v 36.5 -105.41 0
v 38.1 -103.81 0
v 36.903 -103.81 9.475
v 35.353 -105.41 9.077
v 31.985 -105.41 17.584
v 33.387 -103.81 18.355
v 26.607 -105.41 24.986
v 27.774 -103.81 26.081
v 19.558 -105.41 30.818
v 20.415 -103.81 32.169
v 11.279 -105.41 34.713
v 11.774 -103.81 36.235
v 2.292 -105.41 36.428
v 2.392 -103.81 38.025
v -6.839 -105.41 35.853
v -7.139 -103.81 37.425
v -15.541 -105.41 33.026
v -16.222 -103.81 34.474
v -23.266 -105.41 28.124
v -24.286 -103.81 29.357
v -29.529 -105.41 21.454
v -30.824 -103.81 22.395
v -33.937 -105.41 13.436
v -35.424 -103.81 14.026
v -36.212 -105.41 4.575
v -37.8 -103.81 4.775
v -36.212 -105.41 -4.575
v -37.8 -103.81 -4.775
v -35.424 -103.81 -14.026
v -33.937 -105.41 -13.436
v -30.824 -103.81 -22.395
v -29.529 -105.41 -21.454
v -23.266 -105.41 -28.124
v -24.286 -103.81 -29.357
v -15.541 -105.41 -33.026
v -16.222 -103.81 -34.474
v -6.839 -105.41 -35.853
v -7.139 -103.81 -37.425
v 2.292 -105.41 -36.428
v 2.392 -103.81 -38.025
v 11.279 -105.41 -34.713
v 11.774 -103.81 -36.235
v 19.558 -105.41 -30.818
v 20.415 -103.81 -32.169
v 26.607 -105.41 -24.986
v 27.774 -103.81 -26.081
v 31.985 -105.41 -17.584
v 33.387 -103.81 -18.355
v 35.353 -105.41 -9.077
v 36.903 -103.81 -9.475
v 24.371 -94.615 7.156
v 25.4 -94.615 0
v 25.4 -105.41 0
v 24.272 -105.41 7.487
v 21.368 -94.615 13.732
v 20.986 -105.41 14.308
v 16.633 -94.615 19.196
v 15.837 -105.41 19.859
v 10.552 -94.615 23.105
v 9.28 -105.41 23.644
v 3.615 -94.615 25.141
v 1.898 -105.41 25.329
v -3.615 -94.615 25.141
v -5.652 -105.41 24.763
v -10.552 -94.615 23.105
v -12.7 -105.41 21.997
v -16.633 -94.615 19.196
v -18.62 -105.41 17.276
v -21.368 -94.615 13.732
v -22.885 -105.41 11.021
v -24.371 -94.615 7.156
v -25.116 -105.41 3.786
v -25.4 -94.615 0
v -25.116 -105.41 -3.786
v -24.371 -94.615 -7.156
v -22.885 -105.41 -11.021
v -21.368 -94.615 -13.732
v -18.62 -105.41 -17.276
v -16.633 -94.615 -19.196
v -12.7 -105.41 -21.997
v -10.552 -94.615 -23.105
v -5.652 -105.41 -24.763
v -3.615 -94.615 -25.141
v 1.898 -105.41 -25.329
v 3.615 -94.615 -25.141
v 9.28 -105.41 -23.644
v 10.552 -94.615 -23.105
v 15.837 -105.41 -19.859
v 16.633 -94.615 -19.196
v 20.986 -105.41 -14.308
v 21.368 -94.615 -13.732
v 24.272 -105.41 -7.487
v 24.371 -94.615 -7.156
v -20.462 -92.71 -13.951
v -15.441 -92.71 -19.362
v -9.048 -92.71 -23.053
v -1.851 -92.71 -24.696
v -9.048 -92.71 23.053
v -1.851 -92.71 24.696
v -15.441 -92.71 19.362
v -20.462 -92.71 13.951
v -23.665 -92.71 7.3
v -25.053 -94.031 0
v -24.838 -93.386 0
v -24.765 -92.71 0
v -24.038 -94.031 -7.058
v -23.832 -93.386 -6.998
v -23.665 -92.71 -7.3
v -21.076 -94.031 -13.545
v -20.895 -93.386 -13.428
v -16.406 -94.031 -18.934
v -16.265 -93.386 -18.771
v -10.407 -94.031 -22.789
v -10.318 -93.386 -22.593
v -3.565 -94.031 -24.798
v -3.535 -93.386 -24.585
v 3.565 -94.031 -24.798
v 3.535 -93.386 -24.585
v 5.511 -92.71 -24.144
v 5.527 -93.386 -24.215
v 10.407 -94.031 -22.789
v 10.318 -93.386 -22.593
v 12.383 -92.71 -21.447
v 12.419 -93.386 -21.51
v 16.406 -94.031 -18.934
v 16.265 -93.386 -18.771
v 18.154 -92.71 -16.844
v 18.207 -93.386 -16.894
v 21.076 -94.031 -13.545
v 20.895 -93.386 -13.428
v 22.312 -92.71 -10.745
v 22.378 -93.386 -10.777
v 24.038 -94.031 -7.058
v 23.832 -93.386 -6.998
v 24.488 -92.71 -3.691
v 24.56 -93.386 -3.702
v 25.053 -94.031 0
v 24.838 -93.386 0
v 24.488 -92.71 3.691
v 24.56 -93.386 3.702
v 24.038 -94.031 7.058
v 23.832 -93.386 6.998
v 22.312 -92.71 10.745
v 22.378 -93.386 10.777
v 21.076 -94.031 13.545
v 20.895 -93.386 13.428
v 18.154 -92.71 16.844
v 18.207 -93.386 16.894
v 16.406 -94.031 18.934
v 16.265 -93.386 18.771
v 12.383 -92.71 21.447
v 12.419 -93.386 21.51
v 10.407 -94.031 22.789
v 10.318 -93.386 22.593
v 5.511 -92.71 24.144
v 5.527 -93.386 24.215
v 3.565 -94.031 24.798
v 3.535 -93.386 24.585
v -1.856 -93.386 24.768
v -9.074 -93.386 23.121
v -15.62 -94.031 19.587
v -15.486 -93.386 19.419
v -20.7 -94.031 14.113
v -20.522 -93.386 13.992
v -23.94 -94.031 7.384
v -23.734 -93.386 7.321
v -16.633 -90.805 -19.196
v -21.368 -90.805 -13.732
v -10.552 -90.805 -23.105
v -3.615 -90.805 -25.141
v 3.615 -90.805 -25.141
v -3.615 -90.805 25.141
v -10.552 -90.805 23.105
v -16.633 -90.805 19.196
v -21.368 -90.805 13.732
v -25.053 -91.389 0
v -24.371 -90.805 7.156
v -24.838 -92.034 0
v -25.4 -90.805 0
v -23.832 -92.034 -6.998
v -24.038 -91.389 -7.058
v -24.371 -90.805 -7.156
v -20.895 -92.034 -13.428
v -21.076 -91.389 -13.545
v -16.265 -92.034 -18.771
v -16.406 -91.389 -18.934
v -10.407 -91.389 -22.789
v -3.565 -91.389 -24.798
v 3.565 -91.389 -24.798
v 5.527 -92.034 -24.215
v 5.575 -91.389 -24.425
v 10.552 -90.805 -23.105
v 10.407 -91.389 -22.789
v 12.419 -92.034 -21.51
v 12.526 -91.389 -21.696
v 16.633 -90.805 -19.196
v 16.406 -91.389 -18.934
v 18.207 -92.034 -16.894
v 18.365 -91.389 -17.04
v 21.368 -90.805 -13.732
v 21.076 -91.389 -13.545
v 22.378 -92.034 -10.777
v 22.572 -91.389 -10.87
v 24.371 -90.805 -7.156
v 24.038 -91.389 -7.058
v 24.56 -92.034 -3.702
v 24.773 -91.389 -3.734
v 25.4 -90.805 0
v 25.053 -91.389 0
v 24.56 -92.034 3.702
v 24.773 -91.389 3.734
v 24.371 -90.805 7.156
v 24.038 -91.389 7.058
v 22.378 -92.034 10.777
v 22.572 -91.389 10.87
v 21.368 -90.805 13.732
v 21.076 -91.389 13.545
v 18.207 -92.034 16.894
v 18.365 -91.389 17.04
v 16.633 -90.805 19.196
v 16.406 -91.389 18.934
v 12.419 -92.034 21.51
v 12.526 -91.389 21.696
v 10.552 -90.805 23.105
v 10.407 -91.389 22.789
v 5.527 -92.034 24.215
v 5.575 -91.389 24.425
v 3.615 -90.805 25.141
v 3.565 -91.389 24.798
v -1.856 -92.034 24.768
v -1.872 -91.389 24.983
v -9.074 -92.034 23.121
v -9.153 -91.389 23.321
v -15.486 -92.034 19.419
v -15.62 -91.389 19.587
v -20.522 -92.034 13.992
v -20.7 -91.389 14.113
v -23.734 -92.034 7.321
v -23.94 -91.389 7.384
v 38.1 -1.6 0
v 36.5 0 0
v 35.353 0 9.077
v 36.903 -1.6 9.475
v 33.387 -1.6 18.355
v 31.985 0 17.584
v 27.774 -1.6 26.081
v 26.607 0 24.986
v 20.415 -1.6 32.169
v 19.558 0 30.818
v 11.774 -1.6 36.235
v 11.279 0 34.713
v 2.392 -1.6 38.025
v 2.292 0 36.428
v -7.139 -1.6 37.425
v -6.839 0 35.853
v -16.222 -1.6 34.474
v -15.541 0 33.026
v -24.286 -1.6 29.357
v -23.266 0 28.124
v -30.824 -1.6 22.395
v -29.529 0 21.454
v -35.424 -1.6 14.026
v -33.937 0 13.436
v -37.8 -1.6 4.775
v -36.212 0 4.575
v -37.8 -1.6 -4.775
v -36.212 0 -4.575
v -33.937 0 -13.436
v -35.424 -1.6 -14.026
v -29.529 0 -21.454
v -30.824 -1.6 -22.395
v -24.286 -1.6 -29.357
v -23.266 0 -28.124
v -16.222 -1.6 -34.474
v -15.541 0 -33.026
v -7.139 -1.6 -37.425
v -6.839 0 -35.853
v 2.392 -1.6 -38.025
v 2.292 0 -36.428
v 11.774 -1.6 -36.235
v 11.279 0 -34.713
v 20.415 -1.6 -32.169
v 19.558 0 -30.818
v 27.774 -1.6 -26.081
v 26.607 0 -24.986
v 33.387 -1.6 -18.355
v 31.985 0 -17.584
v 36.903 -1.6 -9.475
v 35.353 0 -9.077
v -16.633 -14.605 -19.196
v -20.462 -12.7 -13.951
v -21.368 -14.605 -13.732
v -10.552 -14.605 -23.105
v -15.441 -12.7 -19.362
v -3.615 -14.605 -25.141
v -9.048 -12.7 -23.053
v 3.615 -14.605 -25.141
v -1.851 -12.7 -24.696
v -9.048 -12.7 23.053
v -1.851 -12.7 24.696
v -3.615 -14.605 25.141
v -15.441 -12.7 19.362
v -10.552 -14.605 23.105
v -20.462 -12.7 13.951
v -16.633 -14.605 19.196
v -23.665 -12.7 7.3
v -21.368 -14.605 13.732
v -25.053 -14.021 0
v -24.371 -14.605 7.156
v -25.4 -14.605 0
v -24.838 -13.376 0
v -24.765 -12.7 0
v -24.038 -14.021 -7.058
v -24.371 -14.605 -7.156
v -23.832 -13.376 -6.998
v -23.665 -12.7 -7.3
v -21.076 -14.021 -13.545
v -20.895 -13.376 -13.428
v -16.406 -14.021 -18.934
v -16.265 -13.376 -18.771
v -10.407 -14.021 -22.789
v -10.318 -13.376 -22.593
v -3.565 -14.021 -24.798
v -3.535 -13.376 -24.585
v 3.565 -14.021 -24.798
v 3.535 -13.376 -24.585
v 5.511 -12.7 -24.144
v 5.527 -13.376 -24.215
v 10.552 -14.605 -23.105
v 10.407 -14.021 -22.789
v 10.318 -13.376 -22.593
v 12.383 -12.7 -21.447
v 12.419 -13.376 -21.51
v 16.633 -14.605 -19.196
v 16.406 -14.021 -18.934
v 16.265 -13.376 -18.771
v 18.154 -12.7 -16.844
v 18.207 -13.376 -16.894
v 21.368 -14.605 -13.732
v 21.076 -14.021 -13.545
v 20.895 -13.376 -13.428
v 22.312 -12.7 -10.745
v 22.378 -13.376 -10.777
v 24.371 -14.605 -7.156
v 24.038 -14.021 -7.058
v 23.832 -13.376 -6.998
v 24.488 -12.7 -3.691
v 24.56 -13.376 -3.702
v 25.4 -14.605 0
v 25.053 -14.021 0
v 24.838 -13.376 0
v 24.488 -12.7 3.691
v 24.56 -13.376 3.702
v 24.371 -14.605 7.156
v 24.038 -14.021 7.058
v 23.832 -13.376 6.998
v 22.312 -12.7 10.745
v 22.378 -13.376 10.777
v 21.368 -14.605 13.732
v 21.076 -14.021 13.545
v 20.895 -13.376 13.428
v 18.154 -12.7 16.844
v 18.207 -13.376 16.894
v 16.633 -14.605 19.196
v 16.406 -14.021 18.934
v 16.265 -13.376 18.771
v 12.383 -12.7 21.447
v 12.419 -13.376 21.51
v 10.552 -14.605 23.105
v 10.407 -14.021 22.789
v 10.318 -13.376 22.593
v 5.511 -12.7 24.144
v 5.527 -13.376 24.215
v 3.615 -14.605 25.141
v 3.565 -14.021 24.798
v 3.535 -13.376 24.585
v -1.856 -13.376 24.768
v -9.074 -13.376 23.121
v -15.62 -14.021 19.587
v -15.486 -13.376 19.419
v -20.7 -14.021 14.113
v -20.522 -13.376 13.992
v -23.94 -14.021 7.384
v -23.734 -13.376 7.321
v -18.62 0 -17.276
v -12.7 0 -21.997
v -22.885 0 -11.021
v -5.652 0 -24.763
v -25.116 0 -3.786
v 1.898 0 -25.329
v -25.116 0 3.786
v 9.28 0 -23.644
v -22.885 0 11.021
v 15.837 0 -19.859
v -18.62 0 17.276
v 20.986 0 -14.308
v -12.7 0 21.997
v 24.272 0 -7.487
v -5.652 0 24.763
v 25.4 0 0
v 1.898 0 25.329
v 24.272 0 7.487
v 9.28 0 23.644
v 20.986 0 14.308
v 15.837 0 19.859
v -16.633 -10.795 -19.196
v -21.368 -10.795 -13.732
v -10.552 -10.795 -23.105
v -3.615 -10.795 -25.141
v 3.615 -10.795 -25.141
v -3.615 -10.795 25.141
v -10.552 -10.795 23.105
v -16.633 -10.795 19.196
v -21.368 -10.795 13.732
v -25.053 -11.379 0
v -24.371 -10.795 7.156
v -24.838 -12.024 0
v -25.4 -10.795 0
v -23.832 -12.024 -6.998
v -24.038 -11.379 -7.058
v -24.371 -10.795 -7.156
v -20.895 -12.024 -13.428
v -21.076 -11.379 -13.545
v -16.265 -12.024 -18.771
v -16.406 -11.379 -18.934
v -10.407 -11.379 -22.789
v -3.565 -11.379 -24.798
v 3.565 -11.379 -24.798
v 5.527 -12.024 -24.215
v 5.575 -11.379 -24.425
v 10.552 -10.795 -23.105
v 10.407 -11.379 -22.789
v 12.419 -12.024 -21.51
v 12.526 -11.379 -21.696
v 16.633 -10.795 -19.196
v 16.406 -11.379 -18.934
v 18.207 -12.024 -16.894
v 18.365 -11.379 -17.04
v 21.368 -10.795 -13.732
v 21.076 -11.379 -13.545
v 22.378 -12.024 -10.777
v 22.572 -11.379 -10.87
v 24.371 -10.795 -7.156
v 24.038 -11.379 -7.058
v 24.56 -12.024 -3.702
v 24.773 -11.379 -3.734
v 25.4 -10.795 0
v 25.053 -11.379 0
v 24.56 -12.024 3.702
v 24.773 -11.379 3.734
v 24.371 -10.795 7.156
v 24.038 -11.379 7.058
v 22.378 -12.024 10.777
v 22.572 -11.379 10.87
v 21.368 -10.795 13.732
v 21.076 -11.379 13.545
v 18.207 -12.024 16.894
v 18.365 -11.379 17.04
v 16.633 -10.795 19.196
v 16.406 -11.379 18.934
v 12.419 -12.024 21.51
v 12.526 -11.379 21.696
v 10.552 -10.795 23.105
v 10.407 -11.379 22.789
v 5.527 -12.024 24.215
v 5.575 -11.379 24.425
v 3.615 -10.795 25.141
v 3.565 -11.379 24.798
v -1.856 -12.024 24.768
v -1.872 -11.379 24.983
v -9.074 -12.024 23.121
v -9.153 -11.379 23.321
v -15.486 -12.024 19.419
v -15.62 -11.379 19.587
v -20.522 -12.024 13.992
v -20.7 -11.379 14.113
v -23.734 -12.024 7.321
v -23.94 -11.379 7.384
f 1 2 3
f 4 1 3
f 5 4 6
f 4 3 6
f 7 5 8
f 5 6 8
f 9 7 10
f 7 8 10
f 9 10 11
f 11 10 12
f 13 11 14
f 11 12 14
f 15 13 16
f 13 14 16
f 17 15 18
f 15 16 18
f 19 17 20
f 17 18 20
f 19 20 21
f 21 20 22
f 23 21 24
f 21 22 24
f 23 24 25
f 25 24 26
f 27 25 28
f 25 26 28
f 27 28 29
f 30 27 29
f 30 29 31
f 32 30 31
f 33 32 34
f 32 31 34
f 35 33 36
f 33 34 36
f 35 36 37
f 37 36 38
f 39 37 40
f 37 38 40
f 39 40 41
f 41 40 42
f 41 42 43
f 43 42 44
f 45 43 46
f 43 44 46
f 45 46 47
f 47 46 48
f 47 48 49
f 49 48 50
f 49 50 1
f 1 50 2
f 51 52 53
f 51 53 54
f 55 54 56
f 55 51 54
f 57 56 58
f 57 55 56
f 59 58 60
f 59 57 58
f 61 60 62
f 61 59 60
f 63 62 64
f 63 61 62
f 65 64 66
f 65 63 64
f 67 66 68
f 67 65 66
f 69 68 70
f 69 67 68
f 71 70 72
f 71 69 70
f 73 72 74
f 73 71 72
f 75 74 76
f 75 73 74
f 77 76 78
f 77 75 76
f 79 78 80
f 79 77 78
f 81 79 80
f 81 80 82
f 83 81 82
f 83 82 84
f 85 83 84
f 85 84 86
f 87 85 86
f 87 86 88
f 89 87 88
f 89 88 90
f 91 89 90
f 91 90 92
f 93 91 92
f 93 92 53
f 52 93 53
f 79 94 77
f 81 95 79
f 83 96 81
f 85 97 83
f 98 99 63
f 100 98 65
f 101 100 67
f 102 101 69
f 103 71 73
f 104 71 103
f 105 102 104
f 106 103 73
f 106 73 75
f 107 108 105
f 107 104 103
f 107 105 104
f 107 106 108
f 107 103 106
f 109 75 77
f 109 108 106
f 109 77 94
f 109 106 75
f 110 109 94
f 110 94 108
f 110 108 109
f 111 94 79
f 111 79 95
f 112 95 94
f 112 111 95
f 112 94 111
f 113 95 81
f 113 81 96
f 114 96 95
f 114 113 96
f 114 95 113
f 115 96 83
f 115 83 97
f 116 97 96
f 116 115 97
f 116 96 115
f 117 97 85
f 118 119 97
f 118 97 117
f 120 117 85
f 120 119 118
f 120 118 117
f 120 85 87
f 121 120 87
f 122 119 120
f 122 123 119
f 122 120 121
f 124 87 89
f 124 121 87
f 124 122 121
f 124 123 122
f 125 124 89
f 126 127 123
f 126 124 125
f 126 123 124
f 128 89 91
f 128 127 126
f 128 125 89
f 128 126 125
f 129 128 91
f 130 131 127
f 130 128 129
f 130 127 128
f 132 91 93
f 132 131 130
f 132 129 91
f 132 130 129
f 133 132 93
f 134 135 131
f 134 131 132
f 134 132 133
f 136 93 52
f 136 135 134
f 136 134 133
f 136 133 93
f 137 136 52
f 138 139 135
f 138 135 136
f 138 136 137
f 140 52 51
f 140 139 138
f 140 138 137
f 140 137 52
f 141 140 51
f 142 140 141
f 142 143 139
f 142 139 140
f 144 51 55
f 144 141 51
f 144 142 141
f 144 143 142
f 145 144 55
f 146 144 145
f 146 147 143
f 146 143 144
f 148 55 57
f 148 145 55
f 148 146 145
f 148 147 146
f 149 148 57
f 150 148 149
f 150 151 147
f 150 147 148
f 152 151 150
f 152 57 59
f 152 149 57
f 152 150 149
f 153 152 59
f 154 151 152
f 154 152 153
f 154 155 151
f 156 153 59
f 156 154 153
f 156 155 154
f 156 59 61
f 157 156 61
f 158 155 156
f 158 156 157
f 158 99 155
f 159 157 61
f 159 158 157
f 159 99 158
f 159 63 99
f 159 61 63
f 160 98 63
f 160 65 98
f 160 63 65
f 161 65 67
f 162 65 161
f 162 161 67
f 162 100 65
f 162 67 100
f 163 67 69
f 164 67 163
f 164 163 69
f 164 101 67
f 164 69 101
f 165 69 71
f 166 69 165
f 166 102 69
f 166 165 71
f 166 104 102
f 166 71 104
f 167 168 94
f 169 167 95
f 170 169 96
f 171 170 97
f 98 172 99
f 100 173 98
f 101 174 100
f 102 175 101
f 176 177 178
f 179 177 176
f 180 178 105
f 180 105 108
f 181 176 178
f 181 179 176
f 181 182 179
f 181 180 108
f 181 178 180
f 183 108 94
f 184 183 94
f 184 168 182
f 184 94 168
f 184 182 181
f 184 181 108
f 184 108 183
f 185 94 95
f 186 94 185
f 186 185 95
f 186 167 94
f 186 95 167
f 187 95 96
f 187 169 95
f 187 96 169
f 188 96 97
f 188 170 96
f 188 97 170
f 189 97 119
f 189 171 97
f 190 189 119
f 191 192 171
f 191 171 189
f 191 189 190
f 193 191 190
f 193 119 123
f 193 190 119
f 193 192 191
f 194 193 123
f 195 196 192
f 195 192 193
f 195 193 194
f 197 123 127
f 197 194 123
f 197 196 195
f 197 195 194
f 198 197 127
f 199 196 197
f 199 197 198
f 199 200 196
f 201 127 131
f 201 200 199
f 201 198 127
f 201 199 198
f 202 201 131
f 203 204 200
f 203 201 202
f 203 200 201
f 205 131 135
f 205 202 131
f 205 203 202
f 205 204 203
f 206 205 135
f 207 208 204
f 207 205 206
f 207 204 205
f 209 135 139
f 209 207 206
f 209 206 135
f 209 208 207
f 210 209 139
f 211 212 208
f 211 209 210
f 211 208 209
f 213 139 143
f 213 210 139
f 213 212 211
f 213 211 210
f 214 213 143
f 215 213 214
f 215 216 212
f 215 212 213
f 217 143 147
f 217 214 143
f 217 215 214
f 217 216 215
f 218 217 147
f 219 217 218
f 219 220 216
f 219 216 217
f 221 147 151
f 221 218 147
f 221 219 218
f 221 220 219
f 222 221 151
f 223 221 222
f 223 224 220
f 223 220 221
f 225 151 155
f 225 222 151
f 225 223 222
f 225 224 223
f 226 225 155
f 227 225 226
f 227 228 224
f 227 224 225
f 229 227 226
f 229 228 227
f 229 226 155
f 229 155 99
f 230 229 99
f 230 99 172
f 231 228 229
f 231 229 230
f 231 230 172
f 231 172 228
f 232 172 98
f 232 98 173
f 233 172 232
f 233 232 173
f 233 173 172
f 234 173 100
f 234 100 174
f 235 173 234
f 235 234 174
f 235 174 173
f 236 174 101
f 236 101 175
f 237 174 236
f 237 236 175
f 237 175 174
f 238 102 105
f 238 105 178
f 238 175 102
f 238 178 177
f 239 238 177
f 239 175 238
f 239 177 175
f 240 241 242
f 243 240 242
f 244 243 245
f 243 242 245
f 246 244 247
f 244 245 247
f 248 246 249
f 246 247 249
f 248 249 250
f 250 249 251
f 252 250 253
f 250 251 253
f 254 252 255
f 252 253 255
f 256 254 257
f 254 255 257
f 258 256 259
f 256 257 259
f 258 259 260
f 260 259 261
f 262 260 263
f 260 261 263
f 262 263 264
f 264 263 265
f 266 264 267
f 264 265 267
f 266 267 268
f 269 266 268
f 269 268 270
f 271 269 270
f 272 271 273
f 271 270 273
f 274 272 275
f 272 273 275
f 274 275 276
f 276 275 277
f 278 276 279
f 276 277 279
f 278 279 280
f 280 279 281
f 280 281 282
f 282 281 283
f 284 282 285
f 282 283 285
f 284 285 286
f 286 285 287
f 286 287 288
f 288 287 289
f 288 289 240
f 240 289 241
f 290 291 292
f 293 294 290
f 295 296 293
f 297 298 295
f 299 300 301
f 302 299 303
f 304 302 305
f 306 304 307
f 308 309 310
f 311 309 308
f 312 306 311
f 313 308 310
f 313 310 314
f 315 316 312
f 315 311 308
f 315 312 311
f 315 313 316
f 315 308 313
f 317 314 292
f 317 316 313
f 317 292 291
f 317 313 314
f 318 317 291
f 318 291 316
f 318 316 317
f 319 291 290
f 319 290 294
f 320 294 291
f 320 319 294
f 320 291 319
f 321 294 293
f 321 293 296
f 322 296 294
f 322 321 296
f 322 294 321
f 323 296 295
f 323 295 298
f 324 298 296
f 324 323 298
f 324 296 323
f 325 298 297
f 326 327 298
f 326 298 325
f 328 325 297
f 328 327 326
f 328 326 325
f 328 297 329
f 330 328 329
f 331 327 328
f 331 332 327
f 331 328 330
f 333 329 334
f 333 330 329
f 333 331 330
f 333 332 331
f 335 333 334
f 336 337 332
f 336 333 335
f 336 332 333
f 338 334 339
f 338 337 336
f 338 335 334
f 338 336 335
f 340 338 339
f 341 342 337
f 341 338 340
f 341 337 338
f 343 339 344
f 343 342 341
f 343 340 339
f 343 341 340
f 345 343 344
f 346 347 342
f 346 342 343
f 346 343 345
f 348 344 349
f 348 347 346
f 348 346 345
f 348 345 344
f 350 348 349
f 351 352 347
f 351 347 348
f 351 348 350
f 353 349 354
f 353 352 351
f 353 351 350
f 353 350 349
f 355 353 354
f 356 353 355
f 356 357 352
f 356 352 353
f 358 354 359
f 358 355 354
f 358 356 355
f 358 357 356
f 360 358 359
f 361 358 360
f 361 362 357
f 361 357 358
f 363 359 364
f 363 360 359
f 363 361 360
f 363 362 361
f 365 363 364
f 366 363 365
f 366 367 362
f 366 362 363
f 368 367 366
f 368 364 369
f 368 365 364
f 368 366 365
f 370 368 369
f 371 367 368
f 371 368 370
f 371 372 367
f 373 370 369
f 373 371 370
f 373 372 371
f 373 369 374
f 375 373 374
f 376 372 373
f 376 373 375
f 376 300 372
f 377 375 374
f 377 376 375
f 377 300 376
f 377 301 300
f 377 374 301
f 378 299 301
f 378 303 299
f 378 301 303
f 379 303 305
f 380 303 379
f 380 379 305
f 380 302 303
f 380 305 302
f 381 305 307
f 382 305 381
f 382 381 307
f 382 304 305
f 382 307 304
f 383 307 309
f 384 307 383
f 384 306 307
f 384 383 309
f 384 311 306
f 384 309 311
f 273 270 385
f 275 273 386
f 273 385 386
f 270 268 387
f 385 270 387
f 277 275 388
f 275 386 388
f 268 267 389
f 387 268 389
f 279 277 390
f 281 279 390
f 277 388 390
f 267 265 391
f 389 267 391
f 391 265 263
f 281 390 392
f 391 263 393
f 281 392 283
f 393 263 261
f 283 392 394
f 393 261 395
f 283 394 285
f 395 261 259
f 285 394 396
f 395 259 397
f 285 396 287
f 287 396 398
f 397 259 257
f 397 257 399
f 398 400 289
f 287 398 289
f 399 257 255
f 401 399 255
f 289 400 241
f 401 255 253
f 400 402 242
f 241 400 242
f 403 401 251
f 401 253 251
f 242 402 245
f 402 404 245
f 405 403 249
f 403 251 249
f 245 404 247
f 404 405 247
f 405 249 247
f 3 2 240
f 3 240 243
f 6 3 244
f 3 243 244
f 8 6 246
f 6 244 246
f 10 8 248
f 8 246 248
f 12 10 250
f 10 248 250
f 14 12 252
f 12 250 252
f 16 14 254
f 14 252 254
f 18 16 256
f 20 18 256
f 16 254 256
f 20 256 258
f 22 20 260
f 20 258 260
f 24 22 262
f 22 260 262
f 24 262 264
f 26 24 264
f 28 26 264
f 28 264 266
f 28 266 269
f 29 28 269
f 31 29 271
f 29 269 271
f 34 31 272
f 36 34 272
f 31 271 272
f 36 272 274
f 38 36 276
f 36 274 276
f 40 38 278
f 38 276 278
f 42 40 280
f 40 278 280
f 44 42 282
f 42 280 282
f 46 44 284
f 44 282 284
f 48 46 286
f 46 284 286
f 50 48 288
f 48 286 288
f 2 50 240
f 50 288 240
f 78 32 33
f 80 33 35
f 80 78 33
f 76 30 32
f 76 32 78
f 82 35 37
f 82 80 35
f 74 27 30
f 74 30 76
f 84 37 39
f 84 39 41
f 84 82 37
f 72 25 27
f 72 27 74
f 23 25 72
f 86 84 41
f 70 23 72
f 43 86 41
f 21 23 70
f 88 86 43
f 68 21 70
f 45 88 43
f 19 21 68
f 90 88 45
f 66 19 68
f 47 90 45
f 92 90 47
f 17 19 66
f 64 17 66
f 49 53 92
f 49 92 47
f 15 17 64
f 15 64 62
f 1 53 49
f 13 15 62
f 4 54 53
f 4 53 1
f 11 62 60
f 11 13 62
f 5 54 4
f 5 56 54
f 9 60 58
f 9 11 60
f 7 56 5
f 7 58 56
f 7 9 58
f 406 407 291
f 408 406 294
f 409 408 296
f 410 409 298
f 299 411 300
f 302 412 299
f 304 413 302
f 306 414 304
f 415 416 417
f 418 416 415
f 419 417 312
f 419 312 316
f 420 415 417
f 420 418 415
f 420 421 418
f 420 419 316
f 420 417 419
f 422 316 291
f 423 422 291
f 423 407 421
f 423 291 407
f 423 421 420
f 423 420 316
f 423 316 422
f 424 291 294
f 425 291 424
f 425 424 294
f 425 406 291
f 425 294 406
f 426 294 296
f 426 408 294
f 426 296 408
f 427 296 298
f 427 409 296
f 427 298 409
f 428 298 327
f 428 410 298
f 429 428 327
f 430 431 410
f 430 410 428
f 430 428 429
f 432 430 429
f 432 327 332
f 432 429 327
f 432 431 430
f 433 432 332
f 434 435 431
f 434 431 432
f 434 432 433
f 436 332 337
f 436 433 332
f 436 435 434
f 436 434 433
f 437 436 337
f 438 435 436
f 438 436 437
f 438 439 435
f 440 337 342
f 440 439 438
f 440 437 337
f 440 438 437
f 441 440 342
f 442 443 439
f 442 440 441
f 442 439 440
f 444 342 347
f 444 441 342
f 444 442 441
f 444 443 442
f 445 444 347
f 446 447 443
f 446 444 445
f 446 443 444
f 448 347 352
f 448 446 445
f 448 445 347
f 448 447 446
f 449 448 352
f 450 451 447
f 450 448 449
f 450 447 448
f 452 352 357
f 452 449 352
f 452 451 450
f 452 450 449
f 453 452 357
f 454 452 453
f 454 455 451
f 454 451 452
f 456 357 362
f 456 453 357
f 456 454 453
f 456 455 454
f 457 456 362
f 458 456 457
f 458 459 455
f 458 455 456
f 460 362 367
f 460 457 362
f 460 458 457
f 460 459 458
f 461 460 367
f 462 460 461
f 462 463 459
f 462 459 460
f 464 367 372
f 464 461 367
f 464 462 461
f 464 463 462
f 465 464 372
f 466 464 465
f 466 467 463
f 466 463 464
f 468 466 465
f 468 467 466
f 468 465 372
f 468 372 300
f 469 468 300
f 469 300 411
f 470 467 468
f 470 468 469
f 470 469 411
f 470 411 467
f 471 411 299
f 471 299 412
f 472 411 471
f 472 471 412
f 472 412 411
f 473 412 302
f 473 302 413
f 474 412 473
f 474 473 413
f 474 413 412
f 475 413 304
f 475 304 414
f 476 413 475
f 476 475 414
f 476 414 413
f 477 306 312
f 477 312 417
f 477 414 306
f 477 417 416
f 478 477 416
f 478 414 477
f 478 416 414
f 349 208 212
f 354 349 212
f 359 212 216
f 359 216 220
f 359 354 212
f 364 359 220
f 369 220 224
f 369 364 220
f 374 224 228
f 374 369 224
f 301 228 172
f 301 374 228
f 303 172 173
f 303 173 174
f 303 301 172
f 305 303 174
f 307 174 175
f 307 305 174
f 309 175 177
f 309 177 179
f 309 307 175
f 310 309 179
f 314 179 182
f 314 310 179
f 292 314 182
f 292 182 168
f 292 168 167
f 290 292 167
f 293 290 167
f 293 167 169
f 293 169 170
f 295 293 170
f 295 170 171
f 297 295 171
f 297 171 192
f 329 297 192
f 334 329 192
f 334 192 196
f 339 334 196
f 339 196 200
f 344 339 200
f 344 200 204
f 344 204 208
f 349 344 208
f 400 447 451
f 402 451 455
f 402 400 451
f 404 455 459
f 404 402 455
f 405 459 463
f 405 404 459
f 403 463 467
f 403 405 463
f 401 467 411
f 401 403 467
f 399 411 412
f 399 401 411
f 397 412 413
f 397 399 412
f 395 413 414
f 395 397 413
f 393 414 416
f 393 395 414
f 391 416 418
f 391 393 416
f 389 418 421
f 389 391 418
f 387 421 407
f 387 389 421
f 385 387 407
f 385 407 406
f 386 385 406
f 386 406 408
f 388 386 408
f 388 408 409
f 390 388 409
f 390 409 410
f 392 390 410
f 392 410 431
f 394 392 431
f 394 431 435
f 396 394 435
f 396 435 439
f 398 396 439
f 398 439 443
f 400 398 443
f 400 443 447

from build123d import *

# Parameters (mm, degrees)
F0_R     = 38.1
F0_R_2   = 25.4
F1_DEPTH = 105.41
F2_R     = 3.175
F4_SIZE  = 1.6002


with BuildPart() as f1:
    # F0 (on Front) → F1 (new body)
    with BuildSketch(Plane.XZ):
        Circle(F0_R)
        Circle(F0_R_2, mode=Mode.SUBTRACT)
    extrude(amount=F1_DEPTH)

    # F2 (on Top) → F3 (revolve)
    with BuildSketch(Plane.XY):
        with Locations((-27.94, -92.71)):
            Circle(F2_R)
        with Locations((-27.94, -12.7)):
            Circle(F2_R)
    revolve(axis=Axis((0, -105.41, 0), (0, -1, 0)))

    # F4
    f4_edges = [f1.edges().sort_by_distance(p)[0] for p in [
        (-38.1, -105.41, 0),
        (-38.1, 0, 0),
    ]]
    chamfer(f4_edges, length=F4_SIZE)


solid = f1.part
